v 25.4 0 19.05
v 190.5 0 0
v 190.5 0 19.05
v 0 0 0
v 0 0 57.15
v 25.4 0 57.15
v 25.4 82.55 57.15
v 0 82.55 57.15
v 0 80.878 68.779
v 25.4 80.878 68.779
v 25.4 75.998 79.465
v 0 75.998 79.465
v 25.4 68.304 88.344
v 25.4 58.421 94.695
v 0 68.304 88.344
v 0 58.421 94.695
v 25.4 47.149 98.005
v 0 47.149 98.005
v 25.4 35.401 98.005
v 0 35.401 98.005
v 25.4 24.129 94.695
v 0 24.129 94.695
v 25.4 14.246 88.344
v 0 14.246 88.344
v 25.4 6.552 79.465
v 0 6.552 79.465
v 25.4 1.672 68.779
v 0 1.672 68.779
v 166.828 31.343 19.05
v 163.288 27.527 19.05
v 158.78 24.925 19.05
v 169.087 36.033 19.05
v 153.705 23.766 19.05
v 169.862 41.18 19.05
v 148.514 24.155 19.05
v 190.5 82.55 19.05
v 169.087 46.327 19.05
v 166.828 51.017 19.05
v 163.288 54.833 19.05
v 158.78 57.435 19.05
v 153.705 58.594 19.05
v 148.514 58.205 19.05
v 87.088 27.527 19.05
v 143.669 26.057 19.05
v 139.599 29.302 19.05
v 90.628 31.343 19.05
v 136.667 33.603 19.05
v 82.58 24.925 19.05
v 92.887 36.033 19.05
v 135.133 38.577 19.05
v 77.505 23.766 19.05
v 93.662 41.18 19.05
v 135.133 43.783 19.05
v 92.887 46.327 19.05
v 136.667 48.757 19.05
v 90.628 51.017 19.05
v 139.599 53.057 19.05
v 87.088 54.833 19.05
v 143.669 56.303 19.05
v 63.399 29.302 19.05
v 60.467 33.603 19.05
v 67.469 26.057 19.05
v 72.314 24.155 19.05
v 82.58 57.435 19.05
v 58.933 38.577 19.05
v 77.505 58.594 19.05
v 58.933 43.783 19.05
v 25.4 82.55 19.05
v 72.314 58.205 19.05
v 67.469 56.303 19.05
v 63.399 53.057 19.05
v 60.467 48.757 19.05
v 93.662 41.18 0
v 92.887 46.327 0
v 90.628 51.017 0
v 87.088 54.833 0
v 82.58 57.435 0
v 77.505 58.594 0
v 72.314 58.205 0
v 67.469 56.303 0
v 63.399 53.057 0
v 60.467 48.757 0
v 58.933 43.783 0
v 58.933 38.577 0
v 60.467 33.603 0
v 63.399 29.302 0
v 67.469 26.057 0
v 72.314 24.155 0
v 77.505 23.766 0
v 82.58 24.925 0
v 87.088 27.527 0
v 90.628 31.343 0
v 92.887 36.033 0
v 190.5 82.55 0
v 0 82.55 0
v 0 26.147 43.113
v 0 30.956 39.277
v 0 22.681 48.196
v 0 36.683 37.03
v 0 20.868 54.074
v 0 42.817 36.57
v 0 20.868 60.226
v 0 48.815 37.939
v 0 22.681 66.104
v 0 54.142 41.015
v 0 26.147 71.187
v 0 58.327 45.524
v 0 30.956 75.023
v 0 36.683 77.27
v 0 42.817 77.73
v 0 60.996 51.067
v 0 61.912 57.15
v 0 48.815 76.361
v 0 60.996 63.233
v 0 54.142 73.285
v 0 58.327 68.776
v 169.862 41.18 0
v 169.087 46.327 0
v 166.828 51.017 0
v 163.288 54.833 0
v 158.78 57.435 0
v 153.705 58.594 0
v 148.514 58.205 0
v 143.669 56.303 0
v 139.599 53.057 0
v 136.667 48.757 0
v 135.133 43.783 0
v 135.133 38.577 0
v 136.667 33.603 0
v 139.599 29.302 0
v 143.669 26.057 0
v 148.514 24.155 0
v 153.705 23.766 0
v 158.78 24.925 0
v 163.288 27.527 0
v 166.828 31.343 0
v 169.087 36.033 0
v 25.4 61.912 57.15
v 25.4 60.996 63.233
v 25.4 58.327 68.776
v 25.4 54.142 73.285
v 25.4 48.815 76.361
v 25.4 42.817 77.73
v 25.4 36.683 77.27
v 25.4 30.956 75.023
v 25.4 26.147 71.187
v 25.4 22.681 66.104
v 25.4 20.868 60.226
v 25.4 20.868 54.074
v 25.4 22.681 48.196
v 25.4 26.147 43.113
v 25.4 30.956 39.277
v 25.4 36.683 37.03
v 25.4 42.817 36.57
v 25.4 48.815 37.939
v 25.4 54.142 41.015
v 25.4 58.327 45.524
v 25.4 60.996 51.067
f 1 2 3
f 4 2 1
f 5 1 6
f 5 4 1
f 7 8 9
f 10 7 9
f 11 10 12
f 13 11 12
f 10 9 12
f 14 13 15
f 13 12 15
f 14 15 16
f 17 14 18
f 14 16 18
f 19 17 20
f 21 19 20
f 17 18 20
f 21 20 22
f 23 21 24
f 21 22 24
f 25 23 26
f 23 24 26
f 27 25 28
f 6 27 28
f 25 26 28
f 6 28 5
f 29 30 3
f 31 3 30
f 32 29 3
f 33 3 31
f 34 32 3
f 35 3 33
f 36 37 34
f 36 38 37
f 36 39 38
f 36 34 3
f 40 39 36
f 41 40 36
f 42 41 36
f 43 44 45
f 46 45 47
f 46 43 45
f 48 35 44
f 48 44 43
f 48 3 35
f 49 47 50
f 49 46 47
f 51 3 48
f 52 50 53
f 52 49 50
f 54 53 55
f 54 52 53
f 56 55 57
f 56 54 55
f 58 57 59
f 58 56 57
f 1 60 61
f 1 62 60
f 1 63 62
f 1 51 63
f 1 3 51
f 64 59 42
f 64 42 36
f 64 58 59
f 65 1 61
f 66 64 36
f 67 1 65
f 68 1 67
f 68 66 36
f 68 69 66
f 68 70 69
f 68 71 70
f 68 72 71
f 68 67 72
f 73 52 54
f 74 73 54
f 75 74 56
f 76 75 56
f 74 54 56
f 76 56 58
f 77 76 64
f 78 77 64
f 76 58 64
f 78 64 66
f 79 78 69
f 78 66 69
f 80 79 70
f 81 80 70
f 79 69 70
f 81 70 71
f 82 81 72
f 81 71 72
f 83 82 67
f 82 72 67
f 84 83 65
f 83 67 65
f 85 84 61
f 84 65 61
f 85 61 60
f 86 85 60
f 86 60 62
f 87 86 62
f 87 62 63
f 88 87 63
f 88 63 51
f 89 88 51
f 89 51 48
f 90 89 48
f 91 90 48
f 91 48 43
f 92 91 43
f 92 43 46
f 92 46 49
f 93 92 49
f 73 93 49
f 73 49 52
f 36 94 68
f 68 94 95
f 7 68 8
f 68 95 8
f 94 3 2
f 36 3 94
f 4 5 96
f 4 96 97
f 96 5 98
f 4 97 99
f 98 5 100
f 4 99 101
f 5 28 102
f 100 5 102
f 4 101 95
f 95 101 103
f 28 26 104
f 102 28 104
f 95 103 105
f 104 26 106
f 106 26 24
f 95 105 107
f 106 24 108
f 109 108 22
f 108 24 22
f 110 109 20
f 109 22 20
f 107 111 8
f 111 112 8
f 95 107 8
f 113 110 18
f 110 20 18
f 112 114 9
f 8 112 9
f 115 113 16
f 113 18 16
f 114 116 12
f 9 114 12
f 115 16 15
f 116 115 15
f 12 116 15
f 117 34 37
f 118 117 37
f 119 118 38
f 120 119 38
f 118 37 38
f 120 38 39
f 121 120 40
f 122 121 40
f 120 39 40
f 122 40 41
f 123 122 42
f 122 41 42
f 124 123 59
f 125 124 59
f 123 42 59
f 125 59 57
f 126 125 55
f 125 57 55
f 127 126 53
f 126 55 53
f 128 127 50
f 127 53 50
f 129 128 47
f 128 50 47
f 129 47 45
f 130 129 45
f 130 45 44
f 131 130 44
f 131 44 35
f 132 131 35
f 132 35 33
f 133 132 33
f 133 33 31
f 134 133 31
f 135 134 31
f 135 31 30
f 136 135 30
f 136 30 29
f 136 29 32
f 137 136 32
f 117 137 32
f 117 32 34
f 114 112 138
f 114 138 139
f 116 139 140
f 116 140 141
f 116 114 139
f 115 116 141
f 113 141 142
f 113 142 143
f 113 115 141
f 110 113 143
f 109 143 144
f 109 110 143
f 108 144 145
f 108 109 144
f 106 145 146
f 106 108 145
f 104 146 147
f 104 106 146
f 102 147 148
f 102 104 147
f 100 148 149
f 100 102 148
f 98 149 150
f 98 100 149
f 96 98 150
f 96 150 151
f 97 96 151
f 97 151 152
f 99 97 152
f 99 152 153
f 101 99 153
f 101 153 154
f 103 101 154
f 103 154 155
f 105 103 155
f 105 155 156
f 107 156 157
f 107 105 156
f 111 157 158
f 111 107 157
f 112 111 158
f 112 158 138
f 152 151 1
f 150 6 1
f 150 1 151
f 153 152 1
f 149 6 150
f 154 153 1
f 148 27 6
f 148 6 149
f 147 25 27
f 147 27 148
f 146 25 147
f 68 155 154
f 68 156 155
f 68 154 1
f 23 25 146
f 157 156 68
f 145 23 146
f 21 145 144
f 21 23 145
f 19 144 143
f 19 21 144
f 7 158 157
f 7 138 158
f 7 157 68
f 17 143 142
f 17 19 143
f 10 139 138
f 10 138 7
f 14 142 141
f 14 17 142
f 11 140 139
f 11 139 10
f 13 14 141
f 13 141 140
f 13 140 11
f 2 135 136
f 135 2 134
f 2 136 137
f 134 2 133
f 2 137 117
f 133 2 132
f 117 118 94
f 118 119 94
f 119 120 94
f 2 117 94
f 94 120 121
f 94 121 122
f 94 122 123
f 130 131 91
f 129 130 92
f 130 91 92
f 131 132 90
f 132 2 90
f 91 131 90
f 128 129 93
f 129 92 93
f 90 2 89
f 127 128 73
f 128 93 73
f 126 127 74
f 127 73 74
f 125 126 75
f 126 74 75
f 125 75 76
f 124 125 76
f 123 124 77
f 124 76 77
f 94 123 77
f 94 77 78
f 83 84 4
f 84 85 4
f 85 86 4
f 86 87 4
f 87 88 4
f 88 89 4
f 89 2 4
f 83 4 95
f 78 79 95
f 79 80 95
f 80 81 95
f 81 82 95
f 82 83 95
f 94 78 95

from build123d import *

# Parameters (mm, degrees)
F0_R     = 20.6375
F1_DEPTH = 25.4
F0_W     = 82.55
F0_H     = 19.05
F2_DEPTH = 190.5
F3_R     = 17.4625
F4_DEPTH = 25.4


with BuildPart() as f1:
    # F0 (on Right) → F1 (new body)
    with BuildSketch(Plane.YZ):
        with BuildLine():
            Line((0, 57.15), (0, 19.05))
            Line((0, 19.05), (82.55, 19.05))
            Line((82.55, 19.05), (82.55, 57.15))
            ThreePointArc((82.55, 57.15), (41.275, 98.425), (0, 57.15))
        make_face()
        with Locations((41.275, 57.15)):
            Circle(F0_R, mode=Mode.SUBTRACT)
    extrude(amount=F1_DEPTH)

    # F0 (on Right) → F2 (join)
    with BuildSketch(Plane.YZ):
        with Locations((41.275, 9.525)):
            Rectangle(F0_W, F0_H)
    extrude(amount=F2_DEPTH)

    # F3 (on face) → F4 (cut)
    with BuildSketch(Plane.XY.offset(19.05)):
        with Locations((76.2, 41.179956)):
            Circle(F3_R)
        with Locations((152.4, 41.179956)):
            Circle(F3_R)
    extrude(amount=-F4_DEPTH, mode=Mode.SUBTRACT)


solid = f1.part
